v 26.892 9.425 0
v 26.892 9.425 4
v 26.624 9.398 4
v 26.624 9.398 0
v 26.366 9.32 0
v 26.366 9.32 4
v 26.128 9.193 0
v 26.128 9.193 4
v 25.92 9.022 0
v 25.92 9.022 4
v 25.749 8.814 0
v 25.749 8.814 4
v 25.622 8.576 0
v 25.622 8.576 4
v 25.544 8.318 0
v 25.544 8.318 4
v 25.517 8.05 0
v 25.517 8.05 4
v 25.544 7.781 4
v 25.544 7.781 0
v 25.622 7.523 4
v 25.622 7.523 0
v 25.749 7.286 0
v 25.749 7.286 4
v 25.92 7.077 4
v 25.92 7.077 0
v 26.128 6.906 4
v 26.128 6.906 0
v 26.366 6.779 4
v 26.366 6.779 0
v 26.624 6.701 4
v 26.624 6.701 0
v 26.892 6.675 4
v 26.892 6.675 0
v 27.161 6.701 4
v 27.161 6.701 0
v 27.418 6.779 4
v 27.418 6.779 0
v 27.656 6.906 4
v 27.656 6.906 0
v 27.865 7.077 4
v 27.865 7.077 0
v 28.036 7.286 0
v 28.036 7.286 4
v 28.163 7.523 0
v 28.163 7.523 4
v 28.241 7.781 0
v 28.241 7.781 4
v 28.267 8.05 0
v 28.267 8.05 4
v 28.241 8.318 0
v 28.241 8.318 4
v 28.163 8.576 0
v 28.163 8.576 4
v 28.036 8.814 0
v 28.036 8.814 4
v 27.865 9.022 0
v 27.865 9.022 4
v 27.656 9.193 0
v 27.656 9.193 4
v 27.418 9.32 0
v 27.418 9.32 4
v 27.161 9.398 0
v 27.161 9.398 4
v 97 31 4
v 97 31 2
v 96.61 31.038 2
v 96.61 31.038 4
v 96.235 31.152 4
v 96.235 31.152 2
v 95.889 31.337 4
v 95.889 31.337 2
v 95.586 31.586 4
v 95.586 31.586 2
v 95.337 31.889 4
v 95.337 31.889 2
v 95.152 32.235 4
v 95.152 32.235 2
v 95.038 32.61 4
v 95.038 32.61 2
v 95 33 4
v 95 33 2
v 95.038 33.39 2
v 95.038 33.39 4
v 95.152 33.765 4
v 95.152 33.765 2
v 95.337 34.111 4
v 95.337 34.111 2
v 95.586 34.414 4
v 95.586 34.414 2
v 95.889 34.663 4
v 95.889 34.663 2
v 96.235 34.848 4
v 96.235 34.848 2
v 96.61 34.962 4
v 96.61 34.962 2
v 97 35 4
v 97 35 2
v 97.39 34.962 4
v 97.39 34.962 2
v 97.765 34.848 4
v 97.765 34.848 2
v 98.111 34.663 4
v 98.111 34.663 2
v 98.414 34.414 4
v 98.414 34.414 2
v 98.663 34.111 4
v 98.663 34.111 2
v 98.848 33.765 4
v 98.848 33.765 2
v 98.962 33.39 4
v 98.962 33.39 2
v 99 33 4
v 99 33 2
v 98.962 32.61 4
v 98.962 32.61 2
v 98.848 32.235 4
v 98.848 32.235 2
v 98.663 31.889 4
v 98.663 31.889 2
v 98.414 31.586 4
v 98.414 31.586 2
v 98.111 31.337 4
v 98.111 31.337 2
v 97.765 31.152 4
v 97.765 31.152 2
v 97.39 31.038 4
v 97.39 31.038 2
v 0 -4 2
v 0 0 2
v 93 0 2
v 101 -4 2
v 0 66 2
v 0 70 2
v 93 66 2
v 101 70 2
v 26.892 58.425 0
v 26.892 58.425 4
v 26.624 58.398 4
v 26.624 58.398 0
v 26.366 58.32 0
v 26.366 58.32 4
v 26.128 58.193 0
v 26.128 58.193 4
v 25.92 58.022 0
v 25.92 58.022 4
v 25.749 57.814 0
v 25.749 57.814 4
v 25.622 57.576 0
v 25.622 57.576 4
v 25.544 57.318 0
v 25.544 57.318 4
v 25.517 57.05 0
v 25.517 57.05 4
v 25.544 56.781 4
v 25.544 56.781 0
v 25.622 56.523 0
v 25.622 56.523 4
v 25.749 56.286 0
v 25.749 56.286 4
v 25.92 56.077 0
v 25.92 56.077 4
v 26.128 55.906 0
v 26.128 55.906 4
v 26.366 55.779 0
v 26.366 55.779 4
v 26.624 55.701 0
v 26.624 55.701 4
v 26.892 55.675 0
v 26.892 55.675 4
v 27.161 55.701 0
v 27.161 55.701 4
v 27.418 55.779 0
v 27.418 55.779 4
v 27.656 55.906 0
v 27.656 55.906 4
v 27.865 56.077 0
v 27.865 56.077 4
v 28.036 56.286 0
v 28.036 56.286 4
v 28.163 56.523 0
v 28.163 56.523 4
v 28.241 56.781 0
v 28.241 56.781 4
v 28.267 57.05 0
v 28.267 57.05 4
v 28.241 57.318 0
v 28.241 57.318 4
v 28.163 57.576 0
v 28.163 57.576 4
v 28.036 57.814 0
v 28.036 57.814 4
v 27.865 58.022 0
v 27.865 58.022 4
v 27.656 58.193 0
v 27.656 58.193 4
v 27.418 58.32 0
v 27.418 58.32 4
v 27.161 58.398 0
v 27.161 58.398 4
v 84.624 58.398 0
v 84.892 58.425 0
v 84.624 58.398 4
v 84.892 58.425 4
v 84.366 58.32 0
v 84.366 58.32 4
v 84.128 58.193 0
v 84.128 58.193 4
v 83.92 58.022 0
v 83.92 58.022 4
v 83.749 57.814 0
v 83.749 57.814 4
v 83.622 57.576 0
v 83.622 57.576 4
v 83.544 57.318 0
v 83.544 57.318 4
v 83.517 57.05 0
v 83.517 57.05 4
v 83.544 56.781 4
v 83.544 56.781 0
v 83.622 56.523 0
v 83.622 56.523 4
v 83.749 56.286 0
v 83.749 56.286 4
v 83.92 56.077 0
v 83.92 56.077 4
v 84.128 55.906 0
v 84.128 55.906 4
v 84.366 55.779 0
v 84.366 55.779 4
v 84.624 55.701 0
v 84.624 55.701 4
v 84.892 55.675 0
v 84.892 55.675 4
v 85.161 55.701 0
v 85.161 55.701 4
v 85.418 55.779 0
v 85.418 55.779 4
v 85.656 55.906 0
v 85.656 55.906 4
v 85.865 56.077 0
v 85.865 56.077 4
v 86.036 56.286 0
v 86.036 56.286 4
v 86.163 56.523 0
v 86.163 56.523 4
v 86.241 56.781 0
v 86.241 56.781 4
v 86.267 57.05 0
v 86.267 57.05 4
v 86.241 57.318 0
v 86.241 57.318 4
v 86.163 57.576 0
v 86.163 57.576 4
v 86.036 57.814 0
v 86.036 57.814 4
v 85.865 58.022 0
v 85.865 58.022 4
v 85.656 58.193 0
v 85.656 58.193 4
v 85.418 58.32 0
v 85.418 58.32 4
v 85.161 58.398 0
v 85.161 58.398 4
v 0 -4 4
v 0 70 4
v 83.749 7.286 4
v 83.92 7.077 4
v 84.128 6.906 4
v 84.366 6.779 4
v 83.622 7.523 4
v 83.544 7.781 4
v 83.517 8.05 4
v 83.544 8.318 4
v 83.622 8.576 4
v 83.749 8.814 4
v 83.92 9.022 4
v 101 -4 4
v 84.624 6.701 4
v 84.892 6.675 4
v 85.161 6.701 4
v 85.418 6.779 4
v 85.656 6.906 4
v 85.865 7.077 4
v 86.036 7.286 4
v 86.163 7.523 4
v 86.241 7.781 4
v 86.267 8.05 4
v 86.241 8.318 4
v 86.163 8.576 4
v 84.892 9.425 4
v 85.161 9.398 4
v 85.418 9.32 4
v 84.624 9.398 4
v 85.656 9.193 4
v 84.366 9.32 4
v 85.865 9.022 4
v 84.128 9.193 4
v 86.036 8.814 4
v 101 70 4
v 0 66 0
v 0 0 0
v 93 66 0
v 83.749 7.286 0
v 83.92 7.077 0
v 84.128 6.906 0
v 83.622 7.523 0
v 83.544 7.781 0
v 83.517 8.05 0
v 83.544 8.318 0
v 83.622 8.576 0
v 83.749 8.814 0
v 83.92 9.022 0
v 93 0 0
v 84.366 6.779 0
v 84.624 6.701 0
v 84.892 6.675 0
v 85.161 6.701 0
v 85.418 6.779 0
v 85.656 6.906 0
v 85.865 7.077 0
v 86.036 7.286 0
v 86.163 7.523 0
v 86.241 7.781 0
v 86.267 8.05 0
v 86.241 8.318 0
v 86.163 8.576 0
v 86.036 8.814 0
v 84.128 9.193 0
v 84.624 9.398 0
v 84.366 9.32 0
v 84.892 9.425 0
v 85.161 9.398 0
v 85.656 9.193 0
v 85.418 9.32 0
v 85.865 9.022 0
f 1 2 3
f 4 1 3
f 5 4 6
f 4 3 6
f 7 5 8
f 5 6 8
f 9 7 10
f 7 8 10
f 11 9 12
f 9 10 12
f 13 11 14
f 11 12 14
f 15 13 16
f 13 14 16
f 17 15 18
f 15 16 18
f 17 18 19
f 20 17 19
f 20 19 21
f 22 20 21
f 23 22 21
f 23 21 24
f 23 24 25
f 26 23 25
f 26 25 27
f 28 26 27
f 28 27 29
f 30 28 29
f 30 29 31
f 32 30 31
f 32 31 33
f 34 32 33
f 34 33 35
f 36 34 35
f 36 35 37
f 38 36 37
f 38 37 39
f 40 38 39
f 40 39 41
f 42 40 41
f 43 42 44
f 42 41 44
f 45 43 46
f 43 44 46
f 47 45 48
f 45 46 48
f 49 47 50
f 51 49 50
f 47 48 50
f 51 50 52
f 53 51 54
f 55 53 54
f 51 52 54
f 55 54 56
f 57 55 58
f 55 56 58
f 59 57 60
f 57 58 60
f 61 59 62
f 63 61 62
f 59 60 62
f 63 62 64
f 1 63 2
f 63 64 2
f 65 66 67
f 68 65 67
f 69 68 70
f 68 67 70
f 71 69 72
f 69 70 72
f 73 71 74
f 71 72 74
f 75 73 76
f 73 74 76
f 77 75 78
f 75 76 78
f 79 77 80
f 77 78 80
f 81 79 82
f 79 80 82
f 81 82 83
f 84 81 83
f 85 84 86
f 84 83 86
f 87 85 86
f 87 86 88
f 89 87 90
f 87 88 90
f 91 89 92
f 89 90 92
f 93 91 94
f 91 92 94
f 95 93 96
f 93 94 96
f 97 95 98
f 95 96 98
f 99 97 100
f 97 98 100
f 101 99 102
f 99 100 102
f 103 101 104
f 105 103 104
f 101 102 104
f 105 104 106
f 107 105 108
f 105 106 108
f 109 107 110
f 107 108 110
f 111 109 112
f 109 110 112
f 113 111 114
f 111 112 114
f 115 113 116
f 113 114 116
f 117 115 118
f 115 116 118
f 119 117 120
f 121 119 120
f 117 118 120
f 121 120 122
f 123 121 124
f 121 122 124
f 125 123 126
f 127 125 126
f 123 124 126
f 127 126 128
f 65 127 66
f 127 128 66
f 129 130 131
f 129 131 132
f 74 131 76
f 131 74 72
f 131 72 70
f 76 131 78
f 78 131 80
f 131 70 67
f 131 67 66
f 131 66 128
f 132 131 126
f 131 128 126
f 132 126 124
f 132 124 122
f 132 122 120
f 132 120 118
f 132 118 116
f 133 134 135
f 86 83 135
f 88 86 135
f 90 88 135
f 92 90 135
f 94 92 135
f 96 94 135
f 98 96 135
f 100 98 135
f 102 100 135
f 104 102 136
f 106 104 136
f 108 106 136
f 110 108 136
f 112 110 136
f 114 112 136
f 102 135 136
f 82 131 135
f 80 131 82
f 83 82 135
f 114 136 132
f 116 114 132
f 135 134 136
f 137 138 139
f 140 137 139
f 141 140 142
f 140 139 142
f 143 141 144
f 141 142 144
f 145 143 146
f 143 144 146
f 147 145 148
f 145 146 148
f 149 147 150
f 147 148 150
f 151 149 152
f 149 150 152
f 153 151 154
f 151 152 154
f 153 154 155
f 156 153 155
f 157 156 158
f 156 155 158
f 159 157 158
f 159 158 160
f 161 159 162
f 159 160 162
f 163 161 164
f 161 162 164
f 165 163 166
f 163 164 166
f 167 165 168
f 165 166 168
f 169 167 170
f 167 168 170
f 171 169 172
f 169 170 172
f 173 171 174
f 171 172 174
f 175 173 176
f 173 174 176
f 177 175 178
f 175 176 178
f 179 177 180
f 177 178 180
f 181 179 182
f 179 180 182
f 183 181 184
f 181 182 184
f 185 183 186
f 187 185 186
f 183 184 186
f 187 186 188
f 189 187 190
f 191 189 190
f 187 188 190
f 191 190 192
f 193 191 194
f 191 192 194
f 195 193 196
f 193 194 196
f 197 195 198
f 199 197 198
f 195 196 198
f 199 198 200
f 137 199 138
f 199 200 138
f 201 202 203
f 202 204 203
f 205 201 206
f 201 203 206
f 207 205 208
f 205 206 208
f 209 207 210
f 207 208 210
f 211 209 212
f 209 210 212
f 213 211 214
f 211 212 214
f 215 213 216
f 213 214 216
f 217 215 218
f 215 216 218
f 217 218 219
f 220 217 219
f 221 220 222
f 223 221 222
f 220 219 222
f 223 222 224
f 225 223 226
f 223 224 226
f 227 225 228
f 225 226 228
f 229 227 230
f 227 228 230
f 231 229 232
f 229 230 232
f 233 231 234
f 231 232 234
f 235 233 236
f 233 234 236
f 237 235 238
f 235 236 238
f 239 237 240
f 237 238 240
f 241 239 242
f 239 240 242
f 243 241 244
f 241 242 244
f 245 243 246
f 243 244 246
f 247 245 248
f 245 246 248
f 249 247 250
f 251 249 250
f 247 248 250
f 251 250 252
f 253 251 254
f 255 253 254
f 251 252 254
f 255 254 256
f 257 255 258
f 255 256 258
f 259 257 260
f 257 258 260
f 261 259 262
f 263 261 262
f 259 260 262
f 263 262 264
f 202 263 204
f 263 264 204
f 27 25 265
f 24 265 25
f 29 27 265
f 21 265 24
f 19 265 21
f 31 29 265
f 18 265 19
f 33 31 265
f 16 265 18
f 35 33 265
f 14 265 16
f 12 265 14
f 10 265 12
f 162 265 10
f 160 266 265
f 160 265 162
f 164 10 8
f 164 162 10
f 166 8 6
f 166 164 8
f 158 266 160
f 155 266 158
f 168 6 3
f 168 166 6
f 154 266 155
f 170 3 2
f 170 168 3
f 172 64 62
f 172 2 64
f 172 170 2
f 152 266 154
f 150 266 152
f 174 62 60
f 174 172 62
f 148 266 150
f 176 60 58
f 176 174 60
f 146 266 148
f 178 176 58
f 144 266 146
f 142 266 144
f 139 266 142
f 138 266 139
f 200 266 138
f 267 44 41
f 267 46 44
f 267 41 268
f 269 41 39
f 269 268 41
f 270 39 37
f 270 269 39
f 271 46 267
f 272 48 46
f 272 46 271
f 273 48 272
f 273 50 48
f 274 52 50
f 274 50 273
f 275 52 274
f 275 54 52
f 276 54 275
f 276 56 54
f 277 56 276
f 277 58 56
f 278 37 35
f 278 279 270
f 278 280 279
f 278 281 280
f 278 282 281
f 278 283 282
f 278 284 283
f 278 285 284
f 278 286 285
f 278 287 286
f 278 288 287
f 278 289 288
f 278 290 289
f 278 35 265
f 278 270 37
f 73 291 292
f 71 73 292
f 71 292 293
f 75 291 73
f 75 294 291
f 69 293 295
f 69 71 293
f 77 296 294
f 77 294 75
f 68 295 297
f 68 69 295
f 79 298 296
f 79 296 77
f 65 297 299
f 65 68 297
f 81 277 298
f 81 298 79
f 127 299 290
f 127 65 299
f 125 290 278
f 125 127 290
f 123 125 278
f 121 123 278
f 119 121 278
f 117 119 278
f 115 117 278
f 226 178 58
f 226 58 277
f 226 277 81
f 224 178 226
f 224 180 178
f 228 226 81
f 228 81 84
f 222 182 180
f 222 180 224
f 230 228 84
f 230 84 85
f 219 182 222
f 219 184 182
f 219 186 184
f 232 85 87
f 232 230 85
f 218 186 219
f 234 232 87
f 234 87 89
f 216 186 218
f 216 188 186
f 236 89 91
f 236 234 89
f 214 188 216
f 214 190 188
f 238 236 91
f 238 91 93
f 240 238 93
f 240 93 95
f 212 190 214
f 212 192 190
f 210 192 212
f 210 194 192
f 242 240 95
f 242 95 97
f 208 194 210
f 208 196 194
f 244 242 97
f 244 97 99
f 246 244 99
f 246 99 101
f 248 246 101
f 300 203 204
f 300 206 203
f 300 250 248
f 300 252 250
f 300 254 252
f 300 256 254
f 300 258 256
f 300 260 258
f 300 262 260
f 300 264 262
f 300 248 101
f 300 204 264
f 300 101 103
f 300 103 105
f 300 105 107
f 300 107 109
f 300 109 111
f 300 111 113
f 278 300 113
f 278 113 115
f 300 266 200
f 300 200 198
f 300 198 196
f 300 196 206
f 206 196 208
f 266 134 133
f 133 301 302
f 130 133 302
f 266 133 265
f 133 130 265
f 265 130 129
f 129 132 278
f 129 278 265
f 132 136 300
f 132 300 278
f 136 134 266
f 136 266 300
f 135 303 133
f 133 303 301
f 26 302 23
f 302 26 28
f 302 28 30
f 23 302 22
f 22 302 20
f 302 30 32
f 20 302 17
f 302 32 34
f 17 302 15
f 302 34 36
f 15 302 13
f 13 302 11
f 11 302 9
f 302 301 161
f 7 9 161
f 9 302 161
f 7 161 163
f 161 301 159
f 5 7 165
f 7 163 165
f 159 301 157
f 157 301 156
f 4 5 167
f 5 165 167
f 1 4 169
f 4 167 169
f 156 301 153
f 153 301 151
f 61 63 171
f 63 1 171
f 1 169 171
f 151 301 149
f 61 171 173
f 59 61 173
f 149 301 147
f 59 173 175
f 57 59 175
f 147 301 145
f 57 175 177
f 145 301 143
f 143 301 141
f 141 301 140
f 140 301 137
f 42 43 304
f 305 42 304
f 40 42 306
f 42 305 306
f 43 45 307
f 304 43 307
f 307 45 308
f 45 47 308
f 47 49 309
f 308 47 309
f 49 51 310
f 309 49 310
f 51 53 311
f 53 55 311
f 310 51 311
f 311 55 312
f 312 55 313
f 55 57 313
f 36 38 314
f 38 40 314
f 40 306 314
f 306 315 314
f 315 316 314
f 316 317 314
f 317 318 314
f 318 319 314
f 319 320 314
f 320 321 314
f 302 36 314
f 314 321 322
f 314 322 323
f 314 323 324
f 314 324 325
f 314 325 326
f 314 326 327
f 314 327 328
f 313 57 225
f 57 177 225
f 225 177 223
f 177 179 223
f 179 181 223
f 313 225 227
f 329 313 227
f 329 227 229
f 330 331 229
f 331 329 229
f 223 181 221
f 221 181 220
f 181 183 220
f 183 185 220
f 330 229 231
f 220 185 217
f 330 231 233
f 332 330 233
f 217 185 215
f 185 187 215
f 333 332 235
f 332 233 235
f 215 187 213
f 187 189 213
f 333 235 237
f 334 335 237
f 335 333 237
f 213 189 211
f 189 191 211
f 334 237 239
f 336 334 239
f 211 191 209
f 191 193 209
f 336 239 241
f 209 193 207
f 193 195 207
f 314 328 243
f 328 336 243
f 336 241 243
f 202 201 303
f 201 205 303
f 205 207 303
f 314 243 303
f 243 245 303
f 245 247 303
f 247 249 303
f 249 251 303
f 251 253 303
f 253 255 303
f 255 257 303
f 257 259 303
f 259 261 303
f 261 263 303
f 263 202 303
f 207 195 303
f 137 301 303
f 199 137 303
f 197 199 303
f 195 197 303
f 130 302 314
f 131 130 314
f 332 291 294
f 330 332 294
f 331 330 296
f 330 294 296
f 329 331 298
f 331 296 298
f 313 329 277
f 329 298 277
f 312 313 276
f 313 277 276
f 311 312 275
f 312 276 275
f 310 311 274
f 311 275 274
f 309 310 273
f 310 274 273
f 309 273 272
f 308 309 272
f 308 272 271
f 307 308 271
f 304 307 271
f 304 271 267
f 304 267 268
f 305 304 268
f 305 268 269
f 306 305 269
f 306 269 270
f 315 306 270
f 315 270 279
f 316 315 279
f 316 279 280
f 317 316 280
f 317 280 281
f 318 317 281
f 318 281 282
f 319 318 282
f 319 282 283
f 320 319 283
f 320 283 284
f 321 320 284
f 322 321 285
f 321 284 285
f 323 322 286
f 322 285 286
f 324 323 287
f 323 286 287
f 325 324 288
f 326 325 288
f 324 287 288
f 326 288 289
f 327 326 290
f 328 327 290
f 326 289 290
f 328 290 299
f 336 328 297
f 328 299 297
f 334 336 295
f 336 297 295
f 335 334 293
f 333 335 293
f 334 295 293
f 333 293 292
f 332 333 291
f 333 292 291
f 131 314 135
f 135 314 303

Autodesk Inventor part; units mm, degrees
ref_plane "YZ Plane" through (0, 0, 0) normal (1, 0, 0) x (0, 1, 0)
ref_plane "XZ Plane" through (0, 0, 0) normal (0, 1, 0) x (-1, 0, 0)
ref_plane "XY Plane" through (0, 0, 0) normal (0, 0, 1) x (1, 0, 0)
sketch "Sketch1" plane through (0, 0, 0) normal (0, 0, 1) x (1, 0, 0)
  line L0 (0, 0) -> (93, 0)
  line L1 (93, 0) -> (93, 66)
  line L2 (93, 66) -> (0, 66)
  line L3 (0, 66) -> (0, 0)
  dimension "d0" = 93
  dimension "d1" = 66
extrude "Extrusion1" add sketch "Sketch1" along normal blind 2
sketch "Sketch2" plane through (0, 0, 2) normal (0, 0, 1) x (1, 0, 0)
  line L0 (93, 0) -> (93, 66) projected
  line L1 (93, 66) -> (0, 66) projected
  line L2 (0, 66) -> (0, 0) projected
  line L3 (0, 0) -> (93, 0) projected
  line L4 (0, 70) -> (101, 70)
  line L5 (101, 70) -> (101, -4)
  line L6 (101, -4) -> (0, -4)
  line L7 (0, 66) -> (0, 70)
  line L8 (0, -4) -> (0, 0)
  dimension "d4" = 4
  dimension "d5" = 8
  dimension "d6" = 4
extrude "Extrusion2" add sketch "Sketch2" along normal blind 2
sketch "Sketch3" plane through (0, 0, 0) normal (0, 0, -1) x (-1, 0, 0)
  circle A0 centre (-26.8923, 57.0496) radius 1.375 projected
  circle A1 centre (-84.8923, 57.0496) radius 1.375 projected
  circle A2 centre (-84.8923, 8.0496) radius 1.375 projected
  circle A3 centre (-26.8923, 8.0496) radius 1.375 projected
  point P0 (0, 0)
hole "Hole1" at (26.8923, 57.0496, 0) at (84.8923, 57.0496, 0) at (84.8923, 8.0496, 0) at (26.8923, 8.0496, 0) direction (0, 0, 1) diameter 2.75 depth 4
sketch "Sketch4" plane through (0, 0, 4) normal (0, 0, 1) x (1, 0, 0)
  line L0 (101, 70) -> (0, 70) projected
  line L1 (0, -4) -> (101, -4) projected
  line L2 (0, 70) -> (0, -4) projected
  line L3 (101, -4) -> (101, 70) projected
  point P0 (0, 0)
  point P1 (97, 33)
  dimension "d16" = 37
  dimension "d18" = 4
hole "Hole2" at (97, 33, 4) direction (0, 0, -1) diameter 4 depth 3
thread "Thread1" size "M4x0.7" class "6H" standard "ANSI Metric M Profile" full length
thread "Thread2" size "M3x0.5" class "6H" standard "ANSI Metric M Profile" full length
thread "Thread3" size "M3x0.5" class "6H" standard "ANSI Metric M Profile" full length
thread "Thread4" size "M3x0.5" class "6H" standard "ANSI Metric M Profile" full length
thread "Thread5" size "M3x0.5" class "6H" standard "ANSI Metric M Profile" full length
properties part number "Tapa raspberry" material "ABS Plastic"
